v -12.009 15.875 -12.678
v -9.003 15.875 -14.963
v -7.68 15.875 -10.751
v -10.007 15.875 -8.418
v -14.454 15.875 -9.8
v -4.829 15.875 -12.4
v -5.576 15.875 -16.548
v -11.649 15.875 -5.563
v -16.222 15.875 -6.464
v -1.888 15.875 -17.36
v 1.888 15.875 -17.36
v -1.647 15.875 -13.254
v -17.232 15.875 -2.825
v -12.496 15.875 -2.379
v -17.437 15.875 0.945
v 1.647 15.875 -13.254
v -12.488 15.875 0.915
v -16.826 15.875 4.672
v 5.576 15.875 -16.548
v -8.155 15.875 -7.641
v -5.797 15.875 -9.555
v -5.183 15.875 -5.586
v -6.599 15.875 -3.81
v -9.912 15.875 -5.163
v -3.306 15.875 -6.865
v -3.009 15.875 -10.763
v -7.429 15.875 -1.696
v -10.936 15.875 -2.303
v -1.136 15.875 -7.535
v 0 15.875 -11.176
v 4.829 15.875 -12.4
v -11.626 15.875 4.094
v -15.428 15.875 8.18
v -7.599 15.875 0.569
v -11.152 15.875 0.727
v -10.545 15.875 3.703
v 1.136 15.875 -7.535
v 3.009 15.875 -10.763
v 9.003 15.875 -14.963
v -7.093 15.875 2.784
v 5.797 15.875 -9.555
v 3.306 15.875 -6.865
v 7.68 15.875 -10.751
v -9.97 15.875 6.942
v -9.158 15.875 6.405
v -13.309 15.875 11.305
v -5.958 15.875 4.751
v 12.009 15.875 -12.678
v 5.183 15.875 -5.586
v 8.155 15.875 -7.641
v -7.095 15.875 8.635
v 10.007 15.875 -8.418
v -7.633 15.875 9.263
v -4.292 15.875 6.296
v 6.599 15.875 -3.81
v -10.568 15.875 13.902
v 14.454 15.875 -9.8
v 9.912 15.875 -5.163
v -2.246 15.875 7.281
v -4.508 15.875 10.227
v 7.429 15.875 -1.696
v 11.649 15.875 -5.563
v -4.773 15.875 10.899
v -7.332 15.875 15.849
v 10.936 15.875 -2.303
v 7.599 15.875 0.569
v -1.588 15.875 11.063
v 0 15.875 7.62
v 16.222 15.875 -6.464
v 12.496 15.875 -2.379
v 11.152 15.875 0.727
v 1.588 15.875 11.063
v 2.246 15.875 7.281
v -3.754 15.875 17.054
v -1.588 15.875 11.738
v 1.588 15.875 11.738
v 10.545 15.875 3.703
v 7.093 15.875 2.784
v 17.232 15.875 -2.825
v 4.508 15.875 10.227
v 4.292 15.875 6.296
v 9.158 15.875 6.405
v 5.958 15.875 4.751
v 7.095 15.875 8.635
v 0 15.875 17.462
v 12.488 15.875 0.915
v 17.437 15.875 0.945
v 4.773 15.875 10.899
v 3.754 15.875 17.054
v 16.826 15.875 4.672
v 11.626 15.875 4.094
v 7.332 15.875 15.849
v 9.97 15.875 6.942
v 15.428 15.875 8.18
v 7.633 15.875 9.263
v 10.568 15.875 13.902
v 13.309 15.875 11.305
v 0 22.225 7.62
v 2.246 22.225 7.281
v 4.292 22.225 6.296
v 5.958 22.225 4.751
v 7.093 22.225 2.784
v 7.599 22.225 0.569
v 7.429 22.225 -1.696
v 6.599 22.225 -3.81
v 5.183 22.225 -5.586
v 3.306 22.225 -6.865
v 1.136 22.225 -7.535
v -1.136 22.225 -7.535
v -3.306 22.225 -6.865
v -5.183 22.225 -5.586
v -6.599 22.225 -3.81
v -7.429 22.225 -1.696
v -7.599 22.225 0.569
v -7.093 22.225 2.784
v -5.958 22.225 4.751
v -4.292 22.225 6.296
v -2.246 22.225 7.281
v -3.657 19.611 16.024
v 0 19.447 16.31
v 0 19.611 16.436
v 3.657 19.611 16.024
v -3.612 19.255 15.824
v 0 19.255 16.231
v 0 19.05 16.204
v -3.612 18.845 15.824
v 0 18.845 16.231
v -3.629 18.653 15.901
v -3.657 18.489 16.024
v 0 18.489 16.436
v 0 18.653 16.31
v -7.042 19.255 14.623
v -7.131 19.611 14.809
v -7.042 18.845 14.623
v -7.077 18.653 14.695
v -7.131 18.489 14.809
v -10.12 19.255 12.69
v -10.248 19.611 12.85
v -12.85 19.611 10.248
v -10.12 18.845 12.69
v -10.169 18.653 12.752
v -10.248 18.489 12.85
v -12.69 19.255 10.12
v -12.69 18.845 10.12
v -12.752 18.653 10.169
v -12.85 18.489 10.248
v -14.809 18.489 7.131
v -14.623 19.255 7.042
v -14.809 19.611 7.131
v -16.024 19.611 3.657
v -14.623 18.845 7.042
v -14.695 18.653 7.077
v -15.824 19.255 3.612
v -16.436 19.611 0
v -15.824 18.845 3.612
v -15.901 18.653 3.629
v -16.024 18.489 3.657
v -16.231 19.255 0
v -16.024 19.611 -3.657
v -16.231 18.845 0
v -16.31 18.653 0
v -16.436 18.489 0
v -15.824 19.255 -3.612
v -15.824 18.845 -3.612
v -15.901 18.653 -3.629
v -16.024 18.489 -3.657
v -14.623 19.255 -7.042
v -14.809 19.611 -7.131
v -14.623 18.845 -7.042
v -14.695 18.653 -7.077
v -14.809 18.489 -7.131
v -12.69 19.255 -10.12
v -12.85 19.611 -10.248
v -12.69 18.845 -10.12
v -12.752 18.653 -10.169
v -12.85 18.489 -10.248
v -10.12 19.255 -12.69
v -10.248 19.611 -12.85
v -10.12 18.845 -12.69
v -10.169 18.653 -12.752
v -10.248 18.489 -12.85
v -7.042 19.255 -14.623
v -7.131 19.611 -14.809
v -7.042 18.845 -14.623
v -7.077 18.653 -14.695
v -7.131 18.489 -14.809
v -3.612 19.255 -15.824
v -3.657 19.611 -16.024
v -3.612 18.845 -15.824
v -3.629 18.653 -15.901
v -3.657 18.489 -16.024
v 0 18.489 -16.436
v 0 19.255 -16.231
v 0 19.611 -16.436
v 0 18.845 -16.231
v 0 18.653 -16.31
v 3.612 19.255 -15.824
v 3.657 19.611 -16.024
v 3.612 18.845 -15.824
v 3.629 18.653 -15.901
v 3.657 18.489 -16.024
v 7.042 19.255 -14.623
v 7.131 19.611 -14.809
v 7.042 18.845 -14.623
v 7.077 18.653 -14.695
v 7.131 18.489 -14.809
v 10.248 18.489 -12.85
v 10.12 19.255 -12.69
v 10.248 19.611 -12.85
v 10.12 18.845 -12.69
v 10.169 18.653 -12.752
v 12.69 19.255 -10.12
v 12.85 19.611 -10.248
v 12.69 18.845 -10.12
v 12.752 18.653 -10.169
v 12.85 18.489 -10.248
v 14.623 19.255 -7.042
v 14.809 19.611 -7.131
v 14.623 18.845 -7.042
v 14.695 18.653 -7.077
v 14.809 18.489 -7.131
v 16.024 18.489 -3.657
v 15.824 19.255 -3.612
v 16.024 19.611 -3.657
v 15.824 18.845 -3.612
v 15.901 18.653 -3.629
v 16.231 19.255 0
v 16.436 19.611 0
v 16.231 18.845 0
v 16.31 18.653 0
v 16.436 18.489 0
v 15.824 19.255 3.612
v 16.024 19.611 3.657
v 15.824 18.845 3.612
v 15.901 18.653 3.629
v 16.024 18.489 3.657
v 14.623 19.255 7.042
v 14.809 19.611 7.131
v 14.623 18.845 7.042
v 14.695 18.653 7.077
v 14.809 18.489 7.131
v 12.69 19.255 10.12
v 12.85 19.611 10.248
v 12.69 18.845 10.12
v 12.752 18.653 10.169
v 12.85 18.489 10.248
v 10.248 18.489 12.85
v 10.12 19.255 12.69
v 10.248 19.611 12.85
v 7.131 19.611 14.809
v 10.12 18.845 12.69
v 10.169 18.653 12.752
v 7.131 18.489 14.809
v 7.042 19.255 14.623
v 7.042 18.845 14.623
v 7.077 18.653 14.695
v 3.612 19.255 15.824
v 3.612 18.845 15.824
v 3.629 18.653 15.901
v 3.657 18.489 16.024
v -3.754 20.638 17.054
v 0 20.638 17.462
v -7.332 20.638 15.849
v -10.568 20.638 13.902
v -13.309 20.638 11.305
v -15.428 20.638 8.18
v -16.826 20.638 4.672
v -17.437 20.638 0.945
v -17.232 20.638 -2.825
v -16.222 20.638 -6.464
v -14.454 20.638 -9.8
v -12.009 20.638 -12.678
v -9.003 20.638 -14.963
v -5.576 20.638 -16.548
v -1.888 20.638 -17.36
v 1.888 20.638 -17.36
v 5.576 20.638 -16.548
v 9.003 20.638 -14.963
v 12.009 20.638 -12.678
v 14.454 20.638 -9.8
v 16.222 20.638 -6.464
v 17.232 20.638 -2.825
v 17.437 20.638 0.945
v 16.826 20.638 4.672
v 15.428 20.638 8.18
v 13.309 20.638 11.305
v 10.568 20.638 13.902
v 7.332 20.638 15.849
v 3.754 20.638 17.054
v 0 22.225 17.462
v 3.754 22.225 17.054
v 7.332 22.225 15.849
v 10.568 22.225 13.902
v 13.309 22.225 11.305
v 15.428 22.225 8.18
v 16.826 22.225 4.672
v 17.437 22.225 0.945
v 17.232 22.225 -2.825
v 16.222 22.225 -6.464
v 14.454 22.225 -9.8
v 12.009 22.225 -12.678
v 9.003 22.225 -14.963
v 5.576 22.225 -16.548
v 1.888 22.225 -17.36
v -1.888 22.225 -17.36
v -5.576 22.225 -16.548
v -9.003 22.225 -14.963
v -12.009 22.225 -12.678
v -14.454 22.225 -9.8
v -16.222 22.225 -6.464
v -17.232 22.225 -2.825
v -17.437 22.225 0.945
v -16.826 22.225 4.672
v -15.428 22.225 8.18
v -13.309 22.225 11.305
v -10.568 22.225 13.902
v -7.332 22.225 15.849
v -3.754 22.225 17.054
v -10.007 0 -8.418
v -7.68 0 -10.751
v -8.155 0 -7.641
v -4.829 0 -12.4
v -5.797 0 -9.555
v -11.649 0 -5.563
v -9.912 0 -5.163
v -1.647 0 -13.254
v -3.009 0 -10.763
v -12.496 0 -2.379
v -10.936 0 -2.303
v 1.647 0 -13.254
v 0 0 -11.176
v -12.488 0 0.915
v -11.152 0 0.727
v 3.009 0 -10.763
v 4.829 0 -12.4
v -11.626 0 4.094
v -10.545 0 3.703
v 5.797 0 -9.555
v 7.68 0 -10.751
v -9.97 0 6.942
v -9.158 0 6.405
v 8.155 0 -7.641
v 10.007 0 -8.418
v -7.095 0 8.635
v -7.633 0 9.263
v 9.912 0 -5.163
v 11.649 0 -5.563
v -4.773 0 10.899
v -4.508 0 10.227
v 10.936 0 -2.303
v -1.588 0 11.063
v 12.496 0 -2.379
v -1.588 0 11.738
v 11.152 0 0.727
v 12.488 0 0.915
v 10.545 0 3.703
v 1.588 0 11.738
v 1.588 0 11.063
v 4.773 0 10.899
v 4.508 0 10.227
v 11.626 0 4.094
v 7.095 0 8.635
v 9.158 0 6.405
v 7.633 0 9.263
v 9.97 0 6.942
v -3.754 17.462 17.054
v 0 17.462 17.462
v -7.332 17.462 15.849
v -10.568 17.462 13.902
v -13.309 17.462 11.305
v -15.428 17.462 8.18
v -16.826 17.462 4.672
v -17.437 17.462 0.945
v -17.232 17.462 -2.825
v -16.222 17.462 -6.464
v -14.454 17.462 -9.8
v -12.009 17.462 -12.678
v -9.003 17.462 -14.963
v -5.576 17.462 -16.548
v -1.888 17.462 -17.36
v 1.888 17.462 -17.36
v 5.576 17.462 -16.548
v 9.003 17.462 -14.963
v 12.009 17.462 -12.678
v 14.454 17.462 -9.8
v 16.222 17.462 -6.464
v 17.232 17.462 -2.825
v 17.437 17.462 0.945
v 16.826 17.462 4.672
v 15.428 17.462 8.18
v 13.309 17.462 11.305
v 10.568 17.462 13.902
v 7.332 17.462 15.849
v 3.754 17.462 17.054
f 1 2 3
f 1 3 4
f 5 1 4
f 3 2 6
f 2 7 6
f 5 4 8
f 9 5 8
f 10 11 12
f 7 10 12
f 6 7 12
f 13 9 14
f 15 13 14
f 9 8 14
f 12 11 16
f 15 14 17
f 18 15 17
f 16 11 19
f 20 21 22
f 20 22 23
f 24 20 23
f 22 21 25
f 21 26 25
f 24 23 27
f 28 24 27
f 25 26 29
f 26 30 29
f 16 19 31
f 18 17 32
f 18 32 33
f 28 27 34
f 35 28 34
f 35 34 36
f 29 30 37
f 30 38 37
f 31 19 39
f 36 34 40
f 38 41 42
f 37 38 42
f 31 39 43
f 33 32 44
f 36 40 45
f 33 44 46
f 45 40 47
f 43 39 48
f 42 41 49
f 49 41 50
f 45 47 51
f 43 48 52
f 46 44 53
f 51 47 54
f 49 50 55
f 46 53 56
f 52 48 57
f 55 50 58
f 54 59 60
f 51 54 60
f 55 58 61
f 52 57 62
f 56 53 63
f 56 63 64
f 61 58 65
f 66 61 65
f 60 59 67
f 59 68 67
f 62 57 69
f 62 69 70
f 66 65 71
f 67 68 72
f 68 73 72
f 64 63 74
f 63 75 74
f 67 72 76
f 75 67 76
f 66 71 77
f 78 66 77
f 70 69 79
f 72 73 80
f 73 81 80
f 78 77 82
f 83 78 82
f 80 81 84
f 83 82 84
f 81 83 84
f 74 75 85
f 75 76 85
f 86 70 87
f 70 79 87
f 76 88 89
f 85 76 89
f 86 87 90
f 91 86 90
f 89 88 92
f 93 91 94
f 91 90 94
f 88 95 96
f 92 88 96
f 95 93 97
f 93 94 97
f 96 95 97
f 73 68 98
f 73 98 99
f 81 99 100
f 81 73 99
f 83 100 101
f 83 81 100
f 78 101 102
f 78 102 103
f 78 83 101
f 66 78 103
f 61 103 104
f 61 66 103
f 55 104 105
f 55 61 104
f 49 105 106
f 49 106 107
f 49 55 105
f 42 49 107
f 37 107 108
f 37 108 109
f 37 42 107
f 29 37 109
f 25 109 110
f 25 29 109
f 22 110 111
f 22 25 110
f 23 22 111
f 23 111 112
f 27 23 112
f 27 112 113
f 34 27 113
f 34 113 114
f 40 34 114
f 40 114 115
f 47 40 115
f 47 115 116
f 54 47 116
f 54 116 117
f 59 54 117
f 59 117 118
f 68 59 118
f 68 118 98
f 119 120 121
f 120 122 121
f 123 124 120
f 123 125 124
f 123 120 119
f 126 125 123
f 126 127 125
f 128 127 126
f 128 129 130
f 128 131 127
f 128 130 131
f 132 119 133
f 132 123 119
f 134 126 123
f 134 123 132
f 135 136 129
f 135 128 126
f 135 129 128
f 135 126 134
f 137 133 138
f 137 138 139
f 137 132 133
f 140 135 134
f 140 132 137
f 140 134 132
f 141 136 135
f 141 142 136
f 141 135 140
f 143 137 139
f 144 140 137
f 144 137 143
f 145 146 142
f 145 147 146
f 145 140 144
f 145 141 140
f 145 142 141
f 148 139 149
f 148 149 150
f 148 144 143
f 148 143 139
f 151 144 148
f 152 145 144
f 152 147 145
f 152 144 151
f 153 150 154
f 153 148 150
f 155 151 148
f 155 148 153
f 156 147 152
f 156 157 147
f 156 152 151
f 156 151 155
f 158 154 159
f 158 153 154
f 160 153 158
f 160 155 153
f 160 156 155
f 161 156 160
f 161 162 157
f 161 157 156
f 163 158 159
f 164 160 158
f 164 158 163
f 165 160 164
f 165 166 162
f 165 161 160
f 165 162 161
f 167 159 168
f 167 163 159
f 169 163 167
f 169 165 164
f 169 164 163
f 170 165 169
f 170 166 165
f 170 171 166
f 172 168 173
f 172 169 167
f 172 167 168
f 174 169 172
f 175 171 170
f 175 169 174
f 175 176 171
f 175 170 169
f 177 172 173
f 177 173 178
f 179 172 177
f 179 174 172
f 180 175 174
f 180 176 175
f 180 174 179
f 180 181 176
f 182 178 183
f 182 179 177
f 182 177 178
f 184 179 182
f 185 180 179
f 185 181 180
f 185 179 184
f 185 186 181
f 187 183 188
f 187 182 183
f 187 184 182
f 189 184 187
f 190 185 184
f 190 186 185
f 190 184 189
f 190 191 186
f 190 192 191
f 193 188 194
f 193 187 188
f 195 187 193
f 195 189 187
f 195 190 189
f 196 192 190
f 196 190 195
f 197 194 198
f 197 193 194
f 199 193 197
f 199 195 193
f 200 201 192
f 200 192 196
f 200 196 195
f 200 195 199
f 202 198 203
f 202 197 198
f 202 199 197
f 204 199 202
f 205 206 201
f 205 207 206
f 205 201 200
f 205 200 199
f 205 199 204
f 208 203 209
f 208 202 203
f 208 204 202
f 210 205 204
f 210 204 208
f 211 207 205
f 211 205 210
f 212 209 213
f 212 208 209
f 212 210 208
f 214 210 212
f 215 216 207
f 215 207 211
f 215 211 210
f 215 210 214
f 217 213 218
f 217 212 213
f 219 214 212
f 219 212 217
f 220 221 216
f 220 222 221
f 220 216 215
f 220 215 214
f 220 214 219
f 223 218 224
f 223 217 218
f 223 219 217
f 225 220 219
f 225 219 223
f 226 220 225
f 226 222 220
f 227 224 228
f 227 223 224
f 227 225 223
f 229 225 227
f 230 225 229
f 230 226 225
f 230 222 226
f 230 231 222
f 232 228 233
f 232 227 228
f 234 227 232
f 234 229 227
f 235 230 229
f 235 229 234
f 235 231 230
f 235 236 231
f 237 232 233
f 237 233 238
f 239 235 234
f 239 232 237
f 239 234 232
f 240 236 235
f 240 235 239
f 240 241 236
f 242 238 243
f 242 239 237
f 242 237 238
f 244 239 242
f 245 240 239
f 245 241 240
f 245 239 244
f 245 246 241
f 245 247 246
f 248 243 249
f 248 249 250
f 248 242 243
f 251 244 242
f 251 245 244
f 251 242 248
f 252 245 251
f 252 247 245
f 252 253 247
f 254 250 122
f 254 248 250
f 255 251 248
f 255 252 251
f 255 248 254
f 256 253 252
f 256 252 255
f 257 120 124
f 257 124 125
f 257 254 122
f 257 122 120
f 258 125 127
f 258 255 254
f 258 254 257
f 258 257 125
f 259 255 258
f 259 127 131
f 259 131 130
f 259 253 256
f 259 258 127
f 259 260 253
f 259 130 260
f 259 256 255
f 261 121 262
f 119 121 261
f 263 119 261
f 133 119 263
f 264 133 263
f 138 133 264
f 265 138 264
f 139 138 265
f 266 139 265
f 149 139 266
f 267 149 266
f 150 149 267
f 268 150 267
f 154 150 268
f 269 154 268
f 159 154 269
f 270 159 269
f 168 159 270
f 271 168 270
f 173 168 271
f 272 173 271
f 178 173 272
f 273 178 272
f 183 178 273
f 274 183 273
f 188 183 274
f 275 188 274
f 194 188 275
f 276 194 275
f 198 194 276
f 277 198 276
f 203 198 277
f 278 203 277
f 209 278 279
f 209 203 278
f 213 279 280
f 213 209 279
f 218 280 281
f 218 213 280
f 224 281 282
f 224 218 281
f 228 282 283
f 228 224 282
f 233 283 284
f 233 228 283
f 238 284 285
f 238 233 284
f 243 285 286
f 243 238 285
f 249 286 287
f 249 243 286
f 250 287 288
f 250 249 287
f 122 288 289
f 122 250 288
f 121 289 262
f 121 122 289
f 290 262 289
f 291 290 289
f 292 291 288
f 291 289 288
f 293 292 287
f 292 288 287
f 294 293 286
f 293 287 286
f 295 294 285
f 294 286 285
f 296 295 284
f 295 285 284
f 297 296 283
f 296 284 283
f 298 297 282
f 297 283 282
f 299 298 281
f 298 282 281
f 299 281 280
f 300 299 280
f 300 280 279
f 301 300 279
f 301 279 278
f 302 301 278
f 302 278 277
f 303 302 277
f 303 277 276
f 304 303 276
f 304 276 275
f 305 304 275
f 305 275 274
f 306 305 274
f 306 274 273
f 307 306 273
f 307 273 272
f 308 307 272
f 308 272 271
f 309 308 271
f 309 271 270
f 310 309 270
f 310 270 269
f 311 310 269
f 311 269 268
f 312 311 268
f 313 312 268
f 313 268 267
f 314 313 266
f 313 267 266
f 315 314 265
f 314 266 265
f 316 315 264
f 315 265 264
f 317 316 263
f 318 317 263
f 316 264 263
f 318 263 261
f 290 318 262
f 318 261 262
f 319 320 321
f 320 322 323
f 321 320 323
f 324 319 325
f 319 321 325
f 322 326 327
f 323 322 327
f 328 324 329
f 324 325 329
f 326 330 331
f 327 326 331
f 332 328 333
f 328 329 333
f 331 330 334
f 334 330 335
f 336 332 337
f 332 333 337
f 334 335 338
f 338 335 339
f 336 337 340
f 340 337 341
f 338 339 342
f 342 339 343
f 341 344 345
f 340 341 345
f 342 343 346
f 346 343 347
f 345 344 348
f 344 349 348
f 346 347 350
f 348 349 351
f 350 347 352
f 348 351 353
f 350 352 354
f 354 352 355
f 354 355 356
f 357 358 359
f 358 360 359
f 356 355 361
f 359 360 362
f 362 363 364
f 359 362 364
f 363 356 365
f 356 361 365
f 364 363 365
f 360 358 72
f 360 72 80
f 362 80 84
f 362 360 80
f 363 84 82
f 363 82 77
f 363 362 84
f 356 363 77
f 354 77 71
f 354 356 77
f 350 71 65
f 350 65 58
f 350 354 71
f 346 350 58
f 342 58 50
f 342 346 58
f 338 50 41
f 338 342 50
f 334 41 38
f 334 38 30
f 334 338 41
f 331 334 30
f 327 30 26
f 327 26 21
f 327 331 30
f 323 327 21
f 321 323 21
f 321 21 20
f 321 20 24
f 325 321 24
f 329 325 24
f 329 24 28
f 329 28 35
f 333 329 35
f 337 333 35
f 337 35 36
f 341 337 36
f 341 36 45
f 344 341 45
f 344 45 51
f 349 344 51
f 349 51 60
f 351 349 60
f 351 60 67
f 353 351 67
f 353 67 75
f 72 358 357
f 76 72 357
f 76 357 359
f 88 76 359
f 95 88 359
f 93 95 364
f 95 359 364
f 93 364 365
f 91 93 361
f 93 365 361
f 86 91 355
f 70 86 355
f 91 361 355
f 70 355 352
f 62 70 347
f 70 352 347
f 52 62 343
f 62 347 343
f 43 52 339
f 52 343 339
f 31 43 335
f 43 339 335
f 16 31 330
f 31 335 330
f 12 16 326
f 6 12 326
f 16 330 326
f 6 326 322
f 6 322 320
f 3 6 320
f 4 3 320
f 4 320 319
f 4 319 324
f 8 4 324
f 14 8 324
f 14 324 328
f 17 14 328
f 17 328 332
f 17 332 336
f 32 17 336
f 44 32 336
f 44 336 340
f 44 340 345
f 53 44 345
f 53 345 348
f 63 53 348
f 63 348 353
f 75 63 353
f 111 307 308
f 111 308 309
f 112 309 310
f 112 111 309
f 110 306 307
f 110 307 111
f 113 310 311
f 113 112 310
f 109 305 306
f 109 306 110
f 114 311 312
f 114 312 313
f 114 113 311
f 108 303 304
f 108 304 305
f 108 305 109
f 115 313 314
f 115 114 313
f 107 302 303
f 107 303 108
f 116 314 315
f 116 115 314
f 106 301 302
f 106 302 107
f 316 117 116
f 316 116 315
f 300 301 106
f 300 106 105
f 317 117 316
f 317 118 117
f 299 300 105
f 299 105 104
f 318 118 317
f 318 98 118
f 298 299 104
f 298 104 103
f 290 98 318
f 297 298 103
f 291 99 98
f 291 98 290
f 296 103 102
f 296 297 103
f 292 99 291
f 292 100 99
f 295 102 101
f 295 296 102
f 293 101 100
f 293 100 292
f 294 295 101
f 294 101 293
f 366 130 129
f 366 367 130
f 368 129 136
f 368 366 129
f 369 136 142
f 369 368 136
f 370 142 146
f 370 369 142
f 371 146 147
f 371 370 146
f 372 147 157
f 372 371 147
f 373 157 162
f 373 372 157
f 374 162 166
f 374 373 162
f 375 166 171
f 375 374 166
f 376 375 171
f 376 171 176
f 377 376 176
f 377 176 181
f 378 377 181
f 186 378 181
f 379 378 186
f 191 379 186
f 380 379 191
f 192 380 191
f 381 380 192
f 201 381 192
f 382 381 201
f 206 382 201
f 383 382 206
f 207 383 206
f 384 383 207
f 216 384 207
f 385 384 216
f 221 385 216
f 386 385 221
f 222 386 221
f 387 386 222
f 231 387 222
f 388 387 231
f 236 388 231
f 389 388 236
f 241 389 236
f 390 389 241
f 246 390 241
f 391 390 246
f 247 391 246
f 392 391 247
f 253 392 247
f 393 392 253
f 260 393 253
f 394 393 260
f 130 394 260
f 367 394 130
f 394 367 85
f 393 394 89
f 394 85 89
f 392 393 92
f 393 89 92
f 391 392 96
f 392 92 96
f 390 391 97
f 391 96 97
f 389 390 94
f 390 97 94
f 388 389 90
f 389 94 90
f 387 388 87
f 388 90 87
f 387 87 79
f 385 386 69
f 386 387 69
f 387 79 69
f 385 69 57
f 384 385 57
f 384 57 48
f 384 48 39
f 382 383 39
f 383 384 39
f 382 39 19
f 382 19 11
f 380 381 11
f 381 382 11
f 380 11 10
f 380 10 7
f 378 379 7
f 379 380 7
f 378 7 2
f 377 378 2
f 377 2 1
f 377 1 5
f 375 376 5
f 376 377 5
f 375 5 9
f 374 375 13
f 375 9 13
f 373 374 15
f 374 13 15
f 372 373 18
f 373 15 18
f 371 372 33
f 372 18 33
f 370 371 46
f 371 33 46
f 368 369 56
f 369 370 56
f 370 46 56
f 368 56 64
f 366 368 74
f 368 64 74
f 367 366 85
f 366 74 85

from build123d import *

# Parameters (mm, degrees)
SKETCH1_R           = 12.6
SKETCH1_R_2         = 11.176
BOSS_EXTRUDE1_DEPTH = 15.875
SKETCH2_R           = 17.4625
SKETCH2_R_2         = 7.62
BOSS_EXTRUDE2_DEPTH = 6.35
SKETCH4_W           = 3.175
SKETCH4_H           = 15.94800196
CUT_EXTRUDE1_DEPTH  = 15.875


with BuildPart() as part:
    # Sketch1 → Boss-Extrude1 (new body)
    with BuildSketch(Plane(origin=(0, 0, 0), x_dir=(1, 0, 0), z_dir=(0, 1, 0))):
        with Locations(Location((0, 0.762, 0), (0, 0, 270))):
            Circle(SKETCH1_R)
        with Locations(Location((0, 0, 0), (0, 0, 270))):
            Circle(SKETCH1_R_2, mode=Mode.SUBTRACT)
    extrude(amount=BOSS_EXTRUDE1_DEPTH)

    # Sketch2 → Boss-Extrude2 (add)
    with BuildSketch(Plane(origin=(0, 15.875, 0), x_dir=(1, 0, 0), z_dir=(0, 1, 0))):
        with Locations(Location((0, 0, 0), (0, 0, 270))):
            Circle(SKETCH2_R)
        with Locations(Location((0, 0, 0), (0, 0, 270))):
            Circle(SKETCH2_R_2, mode=Mode.SUBTRACT)
    extrude(amount=BOSS_EXTRUDE2_DEPTH)

    # Sketch3 → Cut-Revolve1 (revolve, cut)
    with BuildSketch(Plane.XY, mode=Mode.PRIVATE) as cut_revolve1_sk:
        with BuildLine():
            Line((-17.4625, 20.6375), (-16.436266008, 19.611266008))
            ThreePointArc((-16.436266008, 19.611266008), (-16.203782015, 19.05), (-16.436266008, 18.488733992))
            Line((-16.436266008, 18.488733992), (-17.4625, 17.4625))
            Line((-17.4625, 17.4625), (-17.4625, 20.6375))
        make_face()
    revolve(cut_revolve1_sk.sketch.rotate(Axis((0, 22.225, 0), (0, -1, 0)), 270), axis=Axis((0, 22.225, 0), (0, -1, 0)), mode=Mode.SUBTRACT)

    # Sketch4 → Cut-Extrude1 (cut)
    with BuildSketch(Plane.XZ):
        with Locations((0, 11.838)):
            Rectangle(SKETCH4_W, SKETCH4_H)
    extrude(amount=-CUT_EXTRUDE1_DEPTH, mode=Mode.SUBTRACT)


solid = part.part
